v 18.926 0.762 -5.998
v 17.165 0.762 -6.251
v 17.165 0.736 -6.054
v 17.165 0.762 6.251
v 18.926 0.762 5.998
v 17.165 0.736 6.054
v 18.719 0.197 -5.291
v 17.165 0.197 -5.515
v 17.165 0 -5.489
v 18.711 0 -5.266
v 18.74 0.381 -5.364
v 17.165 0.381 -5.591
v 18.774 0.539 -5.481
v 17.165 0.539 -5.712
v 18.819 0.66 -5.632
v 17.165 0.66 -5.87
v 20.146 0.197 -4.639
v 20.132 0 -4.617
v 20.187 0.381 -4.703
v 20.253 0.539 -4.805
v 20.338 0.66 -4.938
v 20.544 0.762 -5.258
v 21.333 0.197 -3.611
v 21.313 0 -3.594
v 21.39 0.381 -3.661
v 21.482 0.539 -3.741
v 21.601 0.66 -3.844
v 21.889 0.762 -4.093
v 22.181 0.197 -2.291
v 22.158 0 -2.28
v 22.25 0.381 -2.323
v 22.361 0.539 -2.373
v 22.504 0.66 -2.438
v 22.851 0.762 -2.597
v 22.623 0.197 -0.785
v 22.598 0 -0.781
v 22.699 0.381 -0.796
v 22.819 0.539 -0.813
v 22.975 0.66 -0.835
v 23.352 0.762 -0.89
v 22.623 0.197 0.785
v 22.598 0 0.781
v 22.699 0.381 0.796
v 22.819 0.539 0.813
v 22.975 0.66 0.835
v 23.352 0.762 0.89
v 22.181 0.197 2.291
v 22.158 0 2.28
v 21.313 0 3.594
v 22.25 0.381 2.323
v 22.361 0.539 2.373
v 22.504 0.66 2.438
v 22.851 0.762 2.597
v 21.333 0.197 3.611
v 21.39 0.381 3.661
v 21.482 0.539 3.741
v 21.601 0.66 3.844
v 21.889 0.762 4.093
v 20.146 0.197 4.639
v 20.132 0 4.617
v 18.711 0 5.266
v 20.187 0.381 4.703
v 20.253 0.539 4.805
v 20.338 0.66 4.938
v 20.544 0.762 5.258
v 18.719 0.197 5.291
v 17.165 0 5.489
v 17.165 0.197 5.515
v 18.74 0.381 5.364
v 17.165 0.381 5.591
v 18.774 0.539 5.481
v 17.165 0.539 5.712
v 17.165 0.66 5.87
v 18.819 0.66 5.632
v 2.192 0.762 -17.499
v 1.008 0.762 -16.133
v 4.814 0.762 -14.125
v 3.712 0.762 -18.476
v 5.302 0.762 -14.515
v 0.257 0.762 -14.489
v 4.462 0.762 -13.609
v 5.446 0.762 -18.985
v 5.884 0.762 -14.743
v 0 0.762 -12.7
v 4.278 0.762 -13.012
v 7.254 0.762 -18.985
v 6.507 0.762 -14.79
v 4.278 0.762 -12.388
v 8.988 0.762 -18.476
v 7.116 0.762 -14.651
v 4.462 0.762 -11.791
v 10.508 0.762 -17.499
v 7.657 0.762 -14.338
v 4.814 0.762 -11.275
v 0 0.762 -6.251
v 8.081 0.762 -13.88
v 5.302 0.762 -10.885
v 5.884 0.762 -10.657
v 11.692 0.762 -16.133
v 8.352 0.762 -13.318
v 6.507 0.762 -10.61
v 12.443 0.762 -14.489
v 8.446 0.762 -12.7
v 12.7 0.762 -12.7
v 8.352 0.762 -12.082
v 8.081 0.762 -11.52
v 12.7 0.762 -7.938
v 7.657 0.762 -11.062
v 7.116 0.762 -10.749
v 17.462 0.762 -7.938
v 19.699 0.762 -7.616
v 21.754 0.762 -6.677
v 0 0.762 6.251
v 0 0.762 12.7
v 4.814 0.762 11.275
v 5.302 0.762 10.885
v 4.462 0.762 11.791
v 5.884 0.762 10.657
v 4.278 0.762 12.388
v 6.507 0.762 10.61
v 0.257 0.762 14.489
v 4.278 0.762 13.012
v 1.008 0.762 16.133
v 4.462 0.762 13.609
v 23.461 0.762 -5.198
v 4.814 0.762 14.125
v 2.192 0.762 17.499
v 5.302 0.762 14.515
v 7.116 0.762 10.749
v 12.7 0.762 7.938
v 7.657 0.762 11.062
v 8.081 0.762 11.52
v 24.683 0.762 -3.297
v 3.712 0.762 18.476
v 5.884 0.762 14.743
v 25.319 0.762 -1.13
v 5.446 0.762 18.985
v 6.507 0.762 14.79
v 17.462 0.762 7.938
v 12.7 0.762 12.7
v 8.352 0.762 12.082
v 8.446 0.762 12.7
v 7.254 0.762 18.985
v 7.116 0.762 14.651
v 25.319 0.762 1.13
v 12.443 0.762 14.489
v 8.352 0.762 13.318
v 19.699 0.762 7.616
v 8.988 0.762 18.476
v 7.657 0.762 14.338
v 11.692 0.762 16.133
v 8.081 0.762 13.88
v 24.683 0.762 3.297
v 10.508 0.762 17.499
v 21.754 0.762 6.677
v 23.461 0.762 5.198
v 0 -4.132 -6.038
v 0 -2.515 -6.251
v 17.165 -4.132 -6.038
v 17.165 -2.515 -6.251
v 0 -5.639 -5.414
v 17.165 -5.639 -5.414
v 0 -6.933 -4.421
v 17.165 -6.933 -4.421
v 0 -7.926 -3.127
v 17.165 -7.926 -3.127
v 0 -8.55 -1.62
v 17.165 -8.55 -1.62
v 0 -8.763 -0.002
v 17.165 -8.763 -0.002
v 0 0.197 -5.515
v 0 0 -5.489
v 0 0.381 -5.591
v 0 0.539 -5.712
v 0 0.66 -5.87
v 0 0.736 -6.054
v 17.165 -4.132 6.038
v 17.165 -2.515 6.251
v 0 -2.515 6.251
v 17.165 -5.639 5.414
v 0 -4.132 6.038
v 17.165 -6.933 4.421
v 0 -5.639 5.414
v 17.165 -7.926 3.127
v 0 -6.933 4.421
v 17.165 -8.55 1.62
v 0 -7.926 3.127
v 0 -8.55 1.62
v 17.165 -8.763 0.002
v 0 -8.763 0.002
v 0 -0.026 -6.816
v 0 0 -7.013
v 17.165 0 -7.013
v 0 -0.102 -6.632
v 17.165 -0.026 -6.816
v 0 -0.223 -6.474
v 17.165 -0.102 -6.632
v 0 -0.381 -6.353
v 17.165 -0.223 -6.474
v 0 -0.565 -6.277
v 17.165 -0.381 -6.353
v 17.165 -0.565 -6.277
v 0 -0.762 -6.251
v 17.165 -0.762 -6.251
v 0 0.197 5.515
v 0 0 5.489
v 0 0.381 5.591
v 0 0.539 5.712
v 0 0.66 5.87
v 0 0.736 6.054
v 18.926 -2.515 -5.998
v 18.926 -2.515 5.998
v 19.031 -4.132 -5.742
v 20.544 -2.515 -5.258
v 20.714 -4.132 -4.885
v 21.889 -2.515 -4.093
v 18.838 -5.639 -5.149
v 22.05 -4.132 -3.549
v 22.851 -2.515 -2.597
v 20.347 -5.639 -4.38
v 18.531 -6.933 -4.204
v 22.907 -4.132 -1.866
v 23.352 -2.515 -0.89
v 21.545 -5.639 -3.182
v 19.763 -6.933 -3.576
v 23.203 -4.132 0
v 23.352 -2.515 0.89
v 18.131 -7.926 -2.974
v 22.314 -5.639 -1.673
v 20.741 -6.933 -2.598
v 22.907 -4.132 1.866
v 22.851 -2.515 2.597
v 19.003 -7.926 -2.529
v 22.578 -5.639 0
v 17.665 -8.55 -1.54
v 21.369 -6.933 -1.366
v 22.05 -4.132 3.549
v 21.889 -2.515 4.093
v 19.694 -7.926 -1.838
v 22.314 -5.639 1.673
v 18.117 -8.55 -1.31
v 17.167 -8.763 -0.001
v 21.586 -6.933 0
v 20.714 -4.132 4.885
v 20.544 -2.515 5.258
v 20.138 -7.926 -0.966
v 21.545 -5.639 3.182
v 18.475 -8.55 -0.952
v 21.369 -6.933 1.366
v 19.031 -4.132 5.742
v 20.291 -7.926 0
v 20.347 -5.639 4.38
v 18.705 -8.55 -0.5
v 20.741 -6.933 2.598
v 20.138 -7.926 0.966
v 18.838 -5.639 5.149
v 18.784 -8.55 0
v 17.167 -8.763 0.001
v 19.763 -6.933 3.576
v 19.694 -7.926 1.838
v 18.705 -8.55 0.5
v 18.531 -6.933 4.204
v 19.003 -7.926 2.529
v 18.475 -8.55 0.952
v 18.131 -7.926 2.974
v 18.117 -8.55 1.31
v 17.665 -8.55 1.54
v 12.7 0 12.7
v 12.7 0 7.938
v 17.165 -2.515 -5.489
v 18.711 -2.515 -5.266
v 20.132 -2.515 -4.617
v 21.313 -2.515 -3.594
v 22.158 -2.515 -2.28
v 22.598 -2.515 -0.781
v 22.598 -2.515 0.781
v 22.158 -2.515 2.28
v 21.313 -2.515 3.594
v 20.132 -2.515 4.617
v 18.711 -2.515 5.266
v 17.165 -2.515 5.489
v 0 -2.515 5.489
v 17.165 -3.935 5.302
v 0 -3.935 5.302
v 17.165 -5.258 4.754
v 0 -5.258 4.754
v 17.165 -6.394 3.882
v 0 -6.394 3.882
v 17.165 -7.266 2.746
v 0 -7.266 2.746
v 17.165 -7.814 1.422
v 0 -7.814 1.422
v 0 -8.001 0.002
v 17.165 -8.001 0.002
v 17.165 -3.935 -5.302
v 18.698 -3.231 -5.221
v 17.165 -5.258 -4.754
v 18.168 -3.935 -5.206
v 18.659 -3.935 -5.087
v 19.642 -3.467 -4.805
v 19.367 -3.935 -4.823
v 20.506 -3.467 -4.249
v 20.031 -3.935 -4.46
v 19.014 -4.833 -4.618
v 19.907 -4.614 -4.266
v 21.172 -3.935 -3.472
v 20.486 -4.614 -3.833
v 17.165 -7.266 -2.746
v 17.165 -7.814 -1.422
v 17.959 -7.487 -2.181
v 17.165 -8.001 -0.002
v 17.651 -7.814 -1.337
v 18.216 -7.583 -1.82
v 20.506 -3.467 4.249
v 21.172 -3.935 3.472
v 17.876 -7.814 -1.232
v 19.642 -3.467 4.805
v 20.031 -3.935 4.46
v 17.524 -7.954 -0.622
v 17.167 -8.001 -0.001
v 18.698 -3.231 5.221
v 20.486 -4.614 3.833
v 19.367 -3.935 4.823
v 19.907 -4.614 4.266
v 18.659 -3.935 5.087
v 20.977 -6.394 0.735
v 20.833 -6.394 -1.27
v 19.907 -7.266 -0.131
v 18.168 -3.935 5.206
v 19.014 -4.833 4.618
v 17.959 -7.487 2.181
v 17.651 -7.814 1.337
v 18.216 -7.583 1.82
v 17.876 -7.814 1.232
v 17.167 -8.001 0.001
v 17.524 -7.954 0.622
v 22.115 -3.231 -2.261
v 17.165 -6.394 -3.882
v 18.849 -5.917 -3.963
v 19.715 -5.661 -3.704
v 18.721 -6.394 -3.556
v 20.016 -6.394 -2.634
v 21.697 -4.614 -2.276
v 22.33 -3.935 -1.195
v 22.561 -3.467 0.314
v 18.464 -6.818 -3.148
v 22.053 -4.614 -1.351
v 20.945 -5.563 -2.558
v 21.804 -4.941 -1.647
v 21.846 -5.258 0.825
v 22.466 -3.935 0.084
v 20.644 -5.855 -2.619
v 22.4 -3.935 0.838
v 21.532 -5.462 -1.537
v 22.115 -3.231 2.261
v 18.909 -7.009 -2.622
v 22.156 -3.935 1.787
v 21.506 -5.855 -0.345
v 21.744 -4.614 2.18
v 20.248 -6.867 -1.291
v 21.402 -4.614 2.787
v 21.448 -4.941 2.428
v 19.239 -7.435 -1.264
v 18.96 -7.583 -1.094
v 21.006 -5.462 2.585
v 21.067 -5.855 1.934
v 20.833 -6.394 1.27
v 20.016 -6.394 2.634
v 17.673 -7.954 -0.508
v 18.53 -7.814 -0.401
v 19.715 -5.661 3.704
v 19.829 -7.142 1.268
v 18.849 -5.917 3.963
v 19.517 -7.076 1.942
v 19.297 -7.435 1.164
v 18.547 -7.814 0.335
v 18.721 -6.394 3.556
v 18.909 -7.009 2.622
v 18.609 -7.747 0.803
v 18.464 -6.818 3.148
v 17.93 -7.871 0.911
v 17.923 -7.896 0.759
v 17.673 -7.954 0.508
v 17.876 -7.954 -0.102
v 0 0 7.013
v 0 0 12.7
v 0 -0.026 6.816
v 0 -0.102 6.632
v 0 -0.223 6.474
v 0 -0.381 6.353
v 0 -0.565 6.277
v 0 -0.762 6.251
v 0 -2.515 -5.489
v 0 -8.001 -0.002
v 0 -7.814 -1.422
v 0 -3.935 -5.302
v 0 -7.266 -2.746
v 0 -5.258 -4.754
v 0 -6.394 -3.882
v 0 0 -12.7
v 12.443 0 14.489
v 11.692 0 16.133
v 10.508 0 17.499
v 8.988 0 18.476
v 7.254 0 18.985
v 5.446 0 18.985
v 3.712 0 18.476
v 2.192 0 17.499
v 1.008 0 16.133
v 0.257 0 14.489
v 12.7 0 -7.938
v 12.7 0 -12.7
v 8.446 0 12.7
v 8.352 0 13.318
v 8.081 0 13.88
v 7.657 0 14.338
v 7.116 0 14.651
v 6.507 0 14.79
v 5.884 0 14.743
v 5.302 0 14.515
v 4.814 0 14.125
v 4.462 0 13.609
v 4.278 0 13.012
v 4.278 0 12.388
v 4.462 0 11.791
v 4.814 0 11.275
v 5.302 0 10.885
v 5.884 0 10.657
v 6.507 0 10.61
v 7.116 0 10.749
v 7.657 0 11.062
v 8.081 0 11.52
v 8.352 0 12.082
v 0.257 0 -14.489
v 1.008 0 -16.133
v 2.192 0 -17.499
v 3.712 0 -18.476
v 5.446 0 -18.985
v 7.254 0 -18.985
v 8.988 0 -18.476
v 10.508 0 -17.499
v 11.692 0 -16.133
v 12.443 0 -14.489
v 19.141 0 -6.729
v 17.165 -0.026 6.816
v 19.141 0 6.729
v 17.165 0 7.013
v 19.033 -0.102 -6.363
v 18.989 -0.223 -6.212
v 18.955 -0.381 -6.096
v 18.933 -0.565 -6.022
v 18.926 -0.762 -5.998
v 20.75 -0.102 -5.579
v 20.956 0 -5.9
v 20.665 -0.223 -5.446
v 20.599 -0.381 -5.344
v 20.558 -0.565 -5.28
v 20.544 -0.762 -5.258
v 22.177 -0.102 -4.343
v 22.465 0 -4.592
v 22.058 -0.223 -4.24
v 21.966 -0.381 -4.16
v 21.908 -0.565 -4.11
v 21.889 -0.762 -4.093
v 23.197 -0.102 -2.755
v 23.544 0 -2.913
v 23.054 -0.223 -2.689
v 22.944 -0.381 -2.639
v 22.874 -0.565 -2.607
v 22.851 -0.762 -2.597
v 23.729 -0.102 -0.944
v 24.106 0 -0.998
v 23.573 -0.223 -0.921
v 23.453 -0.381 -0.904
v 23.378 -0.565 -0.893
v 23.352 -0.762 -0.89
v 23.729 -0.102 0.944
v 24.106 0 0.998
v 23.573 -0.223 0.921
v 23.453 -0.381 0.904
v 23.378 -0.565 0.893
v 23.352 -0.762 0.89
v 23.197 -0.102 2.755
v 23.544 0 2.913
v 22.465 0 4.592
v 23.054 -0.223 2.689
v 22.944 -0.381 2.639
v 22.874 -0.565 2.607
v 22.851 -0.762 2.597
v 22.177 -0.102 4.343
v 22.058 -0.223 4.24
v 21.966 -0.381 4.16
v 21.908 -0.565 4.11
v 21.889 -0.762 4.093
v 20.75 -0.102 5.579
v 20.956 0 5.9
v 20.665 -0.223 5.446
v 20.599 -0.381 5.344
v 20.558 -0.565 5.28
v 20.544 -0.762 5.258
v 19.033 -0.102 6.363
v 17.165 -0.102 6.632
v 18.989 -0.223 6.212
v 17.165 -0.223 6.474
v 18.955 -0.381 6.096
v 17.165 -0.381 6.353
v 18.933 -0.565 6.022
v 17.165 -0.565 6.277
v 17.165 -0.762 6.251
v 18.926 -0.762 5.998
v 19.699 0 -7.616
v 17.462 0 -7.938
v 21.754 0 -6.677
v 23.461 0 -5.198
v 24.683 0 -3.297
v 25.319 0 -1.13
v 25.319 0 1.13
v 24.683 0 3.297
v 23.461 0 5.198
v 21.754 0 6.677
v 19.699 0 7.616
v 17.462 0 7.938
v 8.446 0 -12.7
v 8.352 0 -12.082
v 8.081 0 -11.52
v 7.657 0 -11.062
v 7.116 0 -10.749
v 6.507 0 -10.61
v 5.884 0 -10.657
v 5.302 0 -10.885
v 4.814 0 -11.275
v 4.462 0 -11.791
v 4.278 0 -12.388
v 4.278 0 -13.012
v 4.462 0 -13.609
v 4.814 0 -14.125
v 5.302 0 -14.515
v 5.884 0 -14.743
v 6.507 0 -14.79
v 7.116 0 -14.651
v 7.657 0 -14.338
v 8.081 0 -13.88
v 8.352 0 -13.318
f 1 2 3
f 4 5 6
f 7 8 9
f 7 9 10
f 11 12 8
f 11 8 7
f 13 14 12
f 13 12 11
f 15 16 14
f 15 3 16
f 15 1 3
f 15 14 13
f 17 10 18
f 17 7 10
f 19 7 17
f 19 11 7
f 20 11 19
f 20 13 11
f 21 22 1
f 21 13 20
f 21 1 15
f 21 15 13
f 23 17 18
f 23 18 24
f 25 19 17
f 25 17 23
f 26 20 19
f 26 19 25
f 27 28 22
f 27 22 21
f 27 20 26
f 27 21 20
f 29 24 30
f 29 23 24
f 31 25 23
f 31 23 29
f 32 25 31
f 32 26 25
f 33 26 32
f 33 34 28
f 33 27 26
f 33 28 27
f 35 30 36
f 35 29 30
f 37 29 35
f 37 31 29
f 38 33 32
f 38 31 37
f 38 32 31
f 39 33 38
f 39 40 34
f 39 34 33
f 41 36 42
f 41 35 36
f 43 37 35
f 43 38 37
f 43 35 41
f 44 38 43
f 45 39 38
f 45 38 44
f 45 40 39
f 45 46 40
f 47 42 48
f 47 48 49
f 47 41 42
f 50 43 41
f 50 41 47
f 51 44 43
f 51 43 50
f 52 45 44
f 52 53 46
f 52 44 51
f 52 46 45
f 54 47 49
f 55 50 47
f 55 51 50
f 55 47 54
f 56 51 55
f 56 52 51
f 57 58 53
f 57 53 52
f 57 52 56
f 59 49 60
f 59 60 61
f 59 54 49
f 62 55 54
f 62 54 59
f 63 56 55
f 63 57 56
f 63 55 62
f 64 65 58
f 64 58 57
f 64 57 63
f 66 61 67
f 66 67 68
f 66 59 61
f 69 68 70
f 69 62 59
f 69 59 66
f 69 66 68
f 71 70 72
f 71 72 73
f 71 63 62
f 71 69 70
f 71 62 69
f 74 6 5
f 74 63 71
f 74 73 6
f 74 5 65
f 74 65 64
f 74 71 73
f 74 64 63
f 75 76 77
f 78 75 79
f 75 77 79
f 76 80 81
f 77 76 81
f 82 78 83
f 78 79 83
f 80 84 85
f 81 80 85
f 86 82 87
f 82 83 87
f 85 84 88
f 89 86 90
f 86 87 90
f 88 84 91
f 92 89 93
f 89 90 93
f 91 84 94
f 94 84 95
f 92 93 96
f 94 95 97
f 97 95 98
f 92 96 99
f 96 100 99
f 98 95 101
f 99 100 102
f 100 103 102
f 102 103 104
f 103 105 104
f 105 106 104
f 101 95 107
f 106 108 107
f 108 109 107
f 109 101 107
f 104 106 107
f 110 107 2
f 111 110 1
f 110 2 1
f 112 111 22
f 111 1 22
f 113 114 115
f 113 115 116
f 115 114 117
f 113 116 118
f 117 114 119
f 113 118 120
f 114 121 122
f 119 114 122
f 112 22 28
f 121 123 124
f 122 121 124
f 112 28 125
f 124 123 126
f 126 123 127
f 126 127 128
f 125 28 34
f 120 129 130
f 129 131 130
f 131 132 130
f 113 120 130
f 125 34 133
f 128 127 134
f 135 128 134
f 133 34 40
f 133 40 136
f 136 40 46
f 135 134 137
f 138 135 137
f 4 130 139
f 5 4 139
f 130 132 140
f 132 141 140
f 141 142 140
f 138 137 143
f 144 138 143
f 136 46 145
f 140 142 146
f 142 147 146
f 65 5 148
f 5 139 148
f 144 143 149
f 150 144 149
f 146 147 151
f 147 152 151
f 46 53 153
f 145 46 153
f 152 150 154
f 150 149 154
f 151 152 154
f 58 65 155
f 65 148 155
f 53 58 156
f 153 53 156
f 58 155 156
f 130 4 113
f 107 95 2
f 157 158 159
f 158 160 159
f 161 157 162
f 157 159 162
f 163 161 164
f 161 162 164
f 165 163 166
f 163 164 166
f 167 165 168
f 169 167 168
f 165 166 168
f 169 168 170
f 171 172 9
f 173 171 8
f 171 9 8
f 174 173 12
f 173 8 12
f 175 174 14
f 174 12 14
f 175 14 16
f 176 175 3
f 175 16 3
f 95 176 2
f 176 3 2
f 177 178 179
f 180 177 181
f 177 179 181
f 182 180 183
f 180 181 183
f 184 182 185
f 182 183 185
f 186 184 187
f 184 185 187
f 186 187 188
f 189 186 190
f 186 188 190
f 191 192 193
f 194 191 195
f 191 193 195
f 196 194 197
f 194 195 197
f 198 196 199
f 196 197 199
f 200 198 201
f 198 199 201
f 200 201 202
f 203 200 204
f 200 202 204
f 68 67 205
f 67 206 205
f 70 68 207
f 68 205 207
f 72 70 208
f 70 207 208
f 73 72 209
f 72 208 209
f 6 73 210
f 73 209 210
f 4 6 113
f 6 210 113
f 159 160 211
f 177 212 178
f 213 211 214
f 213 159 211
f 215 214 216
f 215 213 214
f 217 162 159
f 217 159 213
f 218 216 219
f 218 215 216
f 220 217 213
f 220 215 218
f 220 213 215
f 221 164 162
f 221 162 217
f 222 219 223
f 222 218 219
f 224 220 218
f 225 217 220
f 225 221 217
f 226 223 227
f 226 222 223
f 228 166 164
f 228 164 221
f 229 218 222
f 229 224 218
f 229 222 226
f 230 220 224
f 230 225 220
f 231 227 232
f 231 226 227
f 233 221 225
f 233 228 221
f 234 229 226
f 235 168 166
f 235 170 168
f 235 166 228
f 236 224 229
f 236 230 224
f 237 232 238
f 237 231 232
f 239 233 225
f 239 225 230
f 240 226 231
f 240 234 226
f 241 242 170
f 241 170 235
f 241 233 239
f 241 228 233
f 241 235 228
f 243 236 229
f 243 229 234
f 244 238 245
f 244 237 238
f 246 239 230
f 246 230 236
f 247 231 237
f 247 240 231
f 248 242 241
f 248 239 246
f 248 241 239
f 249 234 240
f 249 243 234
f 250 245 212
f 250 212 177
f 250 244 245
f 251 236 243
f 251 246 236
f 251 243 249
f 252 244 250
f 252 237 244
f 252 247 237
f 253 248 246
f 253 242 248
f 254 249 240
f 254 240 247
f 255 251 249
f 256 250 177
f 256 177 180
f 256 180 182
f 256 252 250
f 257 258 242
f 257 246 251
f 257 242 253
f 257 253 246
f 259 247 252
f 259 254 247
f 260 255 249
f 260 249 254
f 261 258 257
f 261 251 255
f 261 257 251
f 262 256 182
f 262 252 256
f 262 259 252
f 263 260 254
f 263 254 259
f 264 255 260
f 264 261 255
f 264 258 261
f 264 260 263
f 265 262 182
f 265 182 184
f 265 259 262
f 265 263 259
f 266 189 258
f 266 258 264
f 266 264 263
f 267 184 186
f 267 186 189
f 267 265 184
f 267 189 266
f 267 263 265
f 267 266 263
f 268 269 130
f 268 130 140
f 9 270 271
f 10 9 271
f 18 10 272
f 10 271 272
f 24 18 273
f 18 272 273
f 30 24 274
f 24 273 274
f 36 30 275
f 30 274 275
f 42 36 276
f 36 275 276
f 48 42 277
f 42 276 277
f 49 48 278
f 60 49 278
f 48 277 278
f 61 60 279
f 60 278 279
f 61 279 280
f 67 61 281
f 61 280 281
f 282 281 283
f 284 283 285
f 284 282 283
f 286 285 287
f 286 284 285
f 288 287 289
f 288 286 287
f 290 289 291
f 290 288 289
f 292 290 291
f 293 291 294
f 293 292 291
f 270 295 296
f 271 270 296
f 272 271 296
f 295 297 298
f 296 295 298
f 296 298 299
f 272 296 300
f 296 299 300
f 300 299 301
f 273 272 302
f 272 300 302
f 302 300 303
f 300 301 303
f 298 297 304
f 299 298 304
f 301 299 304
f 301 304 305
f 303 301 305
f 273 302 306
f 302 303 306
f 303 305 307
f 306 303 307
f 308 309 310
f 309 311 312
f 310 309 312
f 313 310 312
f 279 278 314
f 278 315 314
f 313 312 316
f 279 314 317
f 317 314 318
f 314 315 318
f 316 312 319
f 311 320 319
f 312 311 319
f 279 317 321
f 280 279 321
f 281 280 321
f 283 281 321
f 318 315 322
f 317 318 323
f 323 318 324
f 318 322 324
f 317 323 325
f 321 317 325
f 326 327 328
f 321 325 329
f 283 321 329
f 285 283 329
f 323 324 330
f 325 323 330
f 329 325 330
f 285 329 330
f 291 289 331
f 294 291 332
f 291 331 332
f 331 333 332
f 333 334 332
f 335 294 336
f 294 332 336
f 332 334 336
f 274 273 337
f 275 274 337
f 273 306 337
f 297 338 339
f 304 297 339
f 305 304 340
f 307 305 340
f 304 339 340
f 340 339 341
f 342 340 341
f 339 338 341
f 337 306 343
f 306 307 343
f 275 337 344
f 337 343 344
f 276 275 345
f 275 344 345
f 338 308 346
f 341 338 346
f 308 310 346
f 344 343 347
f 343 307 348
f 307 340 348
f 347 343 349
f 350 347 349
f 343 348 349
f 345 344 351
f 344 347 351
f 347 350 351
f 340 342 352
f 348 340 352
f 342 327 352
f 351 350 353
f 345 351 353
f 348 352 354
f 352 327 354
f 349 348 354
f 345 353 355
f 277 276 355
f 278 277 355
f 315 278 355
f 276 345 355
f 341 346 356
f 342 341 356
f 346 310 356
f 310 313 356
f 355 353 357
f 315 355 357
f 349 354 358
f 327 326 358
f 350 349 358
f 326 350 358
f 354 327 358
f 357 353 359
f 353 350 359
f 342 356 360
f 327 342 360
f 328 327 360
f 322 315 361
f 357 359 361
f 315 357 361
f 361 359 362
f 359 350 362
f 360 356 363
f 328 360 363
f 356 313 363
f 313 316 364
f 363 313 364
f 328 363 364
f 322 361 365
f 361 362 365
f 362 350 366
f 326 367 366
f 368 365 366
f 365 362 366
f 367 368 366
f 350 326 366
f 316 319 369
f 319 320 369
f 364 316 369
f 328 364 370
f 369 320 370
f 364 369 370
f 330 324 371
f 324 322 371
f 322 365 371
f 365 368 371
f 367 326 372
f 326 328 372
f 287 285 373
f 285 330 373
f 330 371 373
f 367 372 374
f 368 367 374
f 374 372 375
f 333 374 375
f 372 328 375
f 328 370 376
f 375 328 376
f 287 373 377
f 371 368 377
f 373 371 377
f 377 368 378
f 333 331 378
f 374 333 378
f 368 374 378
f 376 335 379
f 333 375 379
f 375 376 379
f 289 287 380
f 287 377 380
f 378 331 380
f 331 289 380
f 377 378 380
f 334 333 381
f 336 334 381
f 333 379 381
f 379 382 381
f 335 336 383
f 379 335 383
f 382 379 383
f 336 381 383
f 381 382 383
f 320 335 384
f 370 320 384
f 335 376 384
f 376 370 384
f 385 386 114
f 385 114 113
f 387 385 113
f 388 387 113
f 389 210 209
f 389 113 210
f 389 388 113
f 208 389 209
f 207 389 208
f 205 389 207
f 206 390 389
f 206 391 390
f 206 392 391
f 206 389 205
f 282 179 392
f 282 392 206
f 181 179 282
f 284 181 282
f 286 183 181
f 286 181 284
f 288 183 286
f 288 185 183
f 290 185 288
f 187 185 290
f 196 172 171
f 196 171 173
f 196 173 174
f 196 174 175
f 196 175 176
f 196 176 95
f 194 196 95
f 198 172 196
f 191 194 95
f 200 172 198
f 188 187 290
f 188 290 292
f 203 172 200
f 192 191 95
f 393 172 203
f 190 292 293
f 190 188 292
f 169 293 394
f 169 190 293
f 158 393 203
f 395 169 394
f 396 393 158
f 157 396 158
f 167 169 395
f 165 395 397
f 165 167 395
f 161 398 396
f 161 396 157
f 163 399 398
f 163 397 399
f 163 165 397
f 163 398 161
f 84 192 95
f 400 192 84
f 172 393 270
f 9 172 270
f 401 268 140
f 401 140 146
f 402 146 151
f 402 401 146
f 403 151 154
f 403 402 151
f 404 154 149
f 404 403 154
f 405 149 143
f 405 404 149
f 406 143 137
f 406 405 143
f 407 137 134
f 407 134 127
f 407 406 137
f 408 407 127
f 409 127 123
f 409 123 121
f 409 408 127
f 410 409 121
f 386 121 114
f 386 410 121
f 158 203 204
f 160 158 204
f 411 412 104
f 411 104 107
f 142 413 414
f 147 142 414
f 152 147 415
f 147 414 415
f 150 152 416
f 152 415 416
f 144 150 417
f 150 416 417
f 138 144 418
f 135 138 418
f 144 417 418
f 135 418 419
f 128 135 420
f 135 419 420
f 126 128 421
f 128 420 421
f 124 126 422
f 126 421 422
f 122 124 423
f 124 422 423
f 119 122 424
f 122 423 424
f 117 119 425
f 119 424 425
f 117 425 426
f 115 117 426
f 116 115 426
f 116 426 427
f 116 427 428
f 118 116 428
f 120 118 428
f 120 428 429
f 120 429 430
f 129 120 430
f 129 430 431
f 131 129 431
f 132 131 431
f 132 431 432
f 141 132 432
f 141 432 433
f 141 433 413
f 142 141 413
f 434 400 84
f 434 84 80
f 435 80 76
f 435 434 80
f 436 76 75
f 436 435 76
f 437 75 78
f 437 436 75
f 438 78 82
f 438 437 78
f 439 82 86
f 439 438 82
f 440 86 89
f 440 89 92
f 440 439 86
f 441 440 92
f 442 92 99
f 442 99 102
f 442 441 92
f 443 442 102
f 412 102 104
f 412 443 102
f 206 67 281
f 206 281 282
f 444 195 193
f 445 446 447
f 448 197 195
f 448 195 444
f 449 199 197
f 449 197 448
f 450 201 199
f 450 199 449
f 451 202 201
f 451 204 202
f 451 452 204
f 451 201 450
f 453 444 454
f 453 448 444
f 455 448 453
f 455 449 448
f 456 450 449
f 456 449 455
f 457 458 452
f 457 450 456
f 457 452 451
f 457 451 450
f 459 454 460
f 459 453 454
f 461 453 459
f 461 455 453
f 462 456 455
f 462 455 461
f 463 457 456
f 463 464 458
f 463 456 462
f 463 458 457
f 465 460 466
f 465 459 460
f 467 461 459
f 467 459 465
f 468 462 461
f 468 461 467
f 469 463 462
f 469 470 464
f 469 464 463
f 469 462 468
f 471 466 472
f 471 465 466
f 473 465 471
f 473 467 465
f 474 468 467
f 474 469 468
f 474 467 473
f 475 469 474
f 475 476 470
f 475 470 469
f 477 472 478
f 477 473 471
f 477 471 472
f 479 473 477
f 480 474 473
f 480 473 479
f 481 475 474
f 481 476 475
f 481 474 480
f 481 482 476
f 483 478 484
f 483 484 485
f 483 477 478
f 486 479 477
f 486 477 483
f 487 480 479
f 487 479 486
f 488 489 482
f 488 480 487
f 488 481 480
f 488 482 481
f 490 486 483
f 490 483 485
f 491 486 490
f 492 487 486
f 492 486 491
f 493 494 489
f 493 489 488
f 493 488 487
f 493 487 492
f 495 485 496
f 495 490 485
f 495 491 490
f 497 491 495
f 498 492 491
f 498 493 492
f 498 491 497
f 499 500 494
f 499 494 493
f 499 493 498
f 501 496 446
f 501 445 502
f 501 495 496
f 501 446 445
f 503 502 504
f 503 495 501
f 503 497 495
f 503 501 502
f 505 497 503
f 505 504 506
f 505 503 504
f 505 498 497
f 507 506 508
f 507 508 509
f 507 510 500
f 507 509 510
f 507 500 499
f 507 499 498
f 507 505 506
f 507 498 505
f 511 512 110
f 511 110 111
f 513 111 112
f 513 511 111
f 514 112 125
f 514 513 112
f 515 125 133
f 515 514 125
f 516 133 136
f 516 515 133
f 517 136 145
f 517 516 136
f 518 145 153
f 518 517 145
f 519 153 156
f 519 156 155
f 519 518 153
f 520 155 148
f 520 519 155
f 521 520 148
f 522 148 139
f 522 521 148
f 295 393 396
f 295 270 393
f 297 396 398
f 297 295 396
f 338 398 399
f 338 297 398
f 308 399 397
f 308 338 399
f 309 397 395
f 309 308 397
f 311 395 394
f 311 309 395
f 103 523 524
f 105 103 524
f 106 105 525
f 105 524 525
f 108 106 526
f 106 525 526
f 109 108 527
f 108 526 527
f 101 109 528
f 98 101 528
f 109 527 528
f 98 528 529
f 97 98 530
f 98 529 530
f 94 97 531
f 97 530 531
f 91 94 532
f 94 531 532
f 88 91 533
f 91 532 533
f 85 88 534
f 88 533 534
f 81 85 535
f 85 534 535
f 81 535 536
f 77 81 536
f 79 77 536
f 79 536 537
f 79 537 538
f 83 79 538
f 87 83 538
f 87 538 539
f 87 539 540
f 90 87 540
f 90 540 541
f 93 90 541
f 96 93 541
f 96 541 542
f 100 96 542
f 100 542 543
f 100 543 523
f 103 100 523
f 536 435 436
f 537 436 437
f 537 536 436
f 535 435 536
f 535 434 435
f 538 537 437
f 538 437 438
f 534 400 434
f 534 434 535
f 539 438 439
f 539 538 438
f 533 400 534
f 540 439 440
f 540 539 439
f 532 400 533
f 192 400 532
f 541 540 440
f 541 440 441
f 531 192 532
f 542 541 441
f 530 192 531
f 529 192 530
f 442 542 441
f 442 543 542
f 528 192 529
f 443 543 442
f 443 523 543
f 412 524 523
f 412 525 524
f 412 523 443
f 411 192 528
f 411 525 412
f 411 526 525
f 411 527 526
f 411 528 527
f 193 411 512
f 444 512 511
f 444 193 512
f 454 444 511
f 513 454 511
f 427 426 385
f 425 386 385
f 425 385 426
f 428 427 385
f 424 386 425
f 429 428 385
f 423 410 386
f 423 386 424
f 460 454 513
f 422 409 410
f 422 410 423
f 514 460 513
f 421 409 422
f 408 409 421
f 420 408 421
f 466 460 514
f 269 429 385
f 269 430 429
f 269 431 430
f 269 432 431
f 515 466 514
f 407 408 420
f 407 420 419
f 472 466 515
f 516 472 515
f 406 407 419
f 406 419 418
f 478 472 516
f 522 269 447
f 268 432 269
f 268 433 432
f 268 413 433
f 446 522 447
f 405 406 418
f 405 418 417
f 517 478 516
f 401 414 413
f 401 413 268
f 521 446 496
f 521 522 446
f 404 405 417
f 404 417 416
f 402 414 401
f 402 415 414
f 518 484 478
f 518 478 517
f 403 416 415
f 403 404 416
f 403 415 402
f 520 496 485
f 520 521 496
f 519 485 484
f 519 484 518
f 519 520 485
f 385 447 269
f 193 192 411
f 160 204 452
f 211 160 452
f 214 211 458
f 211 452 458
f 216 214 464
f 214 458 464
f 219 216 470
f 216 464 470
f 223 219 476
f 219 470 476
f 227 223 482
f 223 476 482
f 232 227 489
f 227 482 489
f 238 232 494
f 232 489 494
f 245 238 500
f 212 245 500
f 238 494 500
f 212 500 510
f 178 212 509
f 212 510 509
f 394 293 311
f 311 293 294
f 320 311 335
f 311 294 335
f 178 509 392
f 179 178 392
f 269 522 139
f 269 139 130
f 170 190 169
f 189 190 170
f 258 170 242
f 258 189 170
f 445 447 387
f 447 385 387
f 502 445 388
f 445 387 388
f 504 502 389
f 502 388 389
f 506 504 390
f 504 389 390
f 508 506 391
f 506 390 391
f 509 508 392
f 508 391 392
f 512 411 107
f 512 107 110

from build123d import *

# Parameters (mm, degrees)
F1_DEPTH    = 0.762
F3_DEPTH    = 8.763
F4_R        = 6.2484
F5_R        = 2.0955
F6_DEPTH    = 0.763
F7_T        = 0.762
F7_T3_DEPTH = 18.68884375
F7_T5_DEPTH = 2.286
F7_T8_ANGLE = 180.000000001
F8_DEPTH    = 0.763
F9_R        = 0.762


# Not quite as in the source:
# - a shell that OpenCascade refuses in one call is made with other operations: the cavity is built on its own and cut out


with BuildPart() as f1:
    # F0 (on Front) → F1 (new body)
    with BuildSketch(Plane.XZ):
        with BuildLine():
            ThreePointArc((12.7, 12.7), (6.35, 19.05), (0, 12.7))
            Line((0, 12.7), (0, -12.7))
            ThreePointArc((0, -12.7), (6.35, -19.05), (12.7, -12.7))
            Line((12.7, -12.7), (12.7, -7.9375))
            Line((12.7, -7.9375), (17.4625, -7.9375))
            ThreePointArc((17.4625, -7.9375), (25.4, 0), (17.4625, 7.9375))
            Line((17.4625, 7.9375), (12.7, 7.9375))
            Line((12.7, 7.9375), (12.7, 12.7))
        make_face()
    extrude(amount=-F1_DEPTH)

    # F2 (on face) → F3 (join)
    with BuildSketch(Plane.XZ):
        with BuildLine():
            Line((17.16484375, 6.25078125), (0, 6.25078125))
            Line((0, 6.25078125), (0, -6.25078125))
            Line((0, -6.25078125), (17.16484375, -6.25078125))
            ThreePointArc((17.16484375, -6.25078125), (23.415625, 0), (17.16484375, 6.25078125))
        make_face()
    extrude(amount=F3_DEPTH)

    # F4
    f4_edges = [f1.edges().sort_by_distance(p)[0] for p in [
        (8.582422, -8.763, 6.250781),
    ]]
    fillet(f4_edges, radius=F4_R)

    # F5 (on face) → F6 (cut, through all)
    with BuildSketch(Plane.XZ):
        with Locations((6.35, 12.7)):
            Circle(F5_R)
        with Locations((6.35, -12.7)):
            Circle(F5_R)
    extrude(amount=-F6_DEPTH, mode=Mode.SUBTRACT)

    # F7: shell of thickness 0.762, made by hand


with BuildPart() as f7_core1:
    # F7_t2: copy of F1
    add(f1.part)

    # the walls: a layer under each face that stays
    f7_faces = [f7_core1.faces().sort_by_distance(p)[0] for p in [
        (8.582421875, -1.2573, -6.25078125),
        (8.582421875, -6.9328860116, -4.4206672616),
        (4.2333333333, 0, -12.7),
        (8.5836125, -8.763, 0),
        (6.35, 0.381, -19.05),
        (8.582421875, -6.9328860116, 4.4206672616),
        (12.7, 0.762, 0),
        (8.582421875, -1.2573, 6.25078125),
        (6.35, 0.381, 19.05),
        (23.415625, -1.2573, 0),
        (21.5855110116, -6.9328860116, 0),
        (12.7, 0.381, -10.31875),
        (15.08125, 0.381, -7.9375),
        (25.4, 0.381, 0),
        (15.08125, 0.381, 7.9375),
        (12.7, 0.381, 10.31875),
        (4.2545, 0.381, -12.7),
        (4.2545, 0.381, 12.7),
    ]]
    thicken(f7_faces, amount=-F7_T, mode=Mode.SUBTRACT)

    # F7_s4 → F7_t3 (cut)
    with BuildSketch(Plane.YZ.offset(-0.762)):
        Polygon((-0.00762, -6.25840125), (0, -5.48878125), (0.762, -5.48878125), (0.762, -6.25078125), align=None)
        Polygon((-0.00762, 6.25840125), (0.762, 6.25078125), (0.762, 5.48878125), (0, 5.48878125), align=None)
    extrude(amount=F7_T3_DEPTH, mode=Mode.SUBTRACT)

    # F7_s6 → F7_t5 (cut)
    with BuildSketch(Plane.XZ.offset(-1.524)):
        Polygon((12.70762, -7.94512), (11.938, -7.9375), (11.938, -7.1755), (12.7, -7.1755), align=None)
        Polygon((12.70762, 7.94512), (12.7, 7.1755), (11.938, 7.1755), (11.938, 7.9375), align=None)
    extrude(amount=F7_T5_DEPTH, mode=Mode.SUBTRACT)

    # F7_s7 → F7_t8 (revolve, cut)
    with BuildSketch(Plane.YZ.offset(17.16484375)):
        Polygon((-0.00762, -6.25840125), (0.762, -6.25078125), (0.762, -5.48878125), (0, -5.48878125), align=None)
    revolve(axis=Axis((17.16484375, 0, 0), (0, -1, 0)), revolution_arc=F7_T8_ANGLE, mode=Mode.SUBTRACT)


with BuildPart() as f1_1:
    add(f1.part)

    # what is left inside the walls is the cavity
    f7_cavity = [f7_core1.part.solids().sort_by_distance(p)[0] for p in [
        (11.326812, -0.00762, -1.829594),
    ]]
    add(f7_cavity, mode=Mode.SUBTRACT)

    # F8 (cut, through all): a face of the model
    f8_faces = [f1_1.faces().sort_by_distance(p)[0] for p in [
        (10.7728031168, 0, 0),
    ]]
    extrude(f8_faces, amount=-F8_DEPTH, mode=Mode.SUBTRACT)

    # F9
    f9_edges = [f1_1.edges().sort_by_distance(p)[0] for p in [
        (8.582422, 0, 6.250781),
        (8.582422, 0.762, 5.488781),
    ]]
    fillet(f9_edges, radius=F9_R)


solid = f1_1.part
